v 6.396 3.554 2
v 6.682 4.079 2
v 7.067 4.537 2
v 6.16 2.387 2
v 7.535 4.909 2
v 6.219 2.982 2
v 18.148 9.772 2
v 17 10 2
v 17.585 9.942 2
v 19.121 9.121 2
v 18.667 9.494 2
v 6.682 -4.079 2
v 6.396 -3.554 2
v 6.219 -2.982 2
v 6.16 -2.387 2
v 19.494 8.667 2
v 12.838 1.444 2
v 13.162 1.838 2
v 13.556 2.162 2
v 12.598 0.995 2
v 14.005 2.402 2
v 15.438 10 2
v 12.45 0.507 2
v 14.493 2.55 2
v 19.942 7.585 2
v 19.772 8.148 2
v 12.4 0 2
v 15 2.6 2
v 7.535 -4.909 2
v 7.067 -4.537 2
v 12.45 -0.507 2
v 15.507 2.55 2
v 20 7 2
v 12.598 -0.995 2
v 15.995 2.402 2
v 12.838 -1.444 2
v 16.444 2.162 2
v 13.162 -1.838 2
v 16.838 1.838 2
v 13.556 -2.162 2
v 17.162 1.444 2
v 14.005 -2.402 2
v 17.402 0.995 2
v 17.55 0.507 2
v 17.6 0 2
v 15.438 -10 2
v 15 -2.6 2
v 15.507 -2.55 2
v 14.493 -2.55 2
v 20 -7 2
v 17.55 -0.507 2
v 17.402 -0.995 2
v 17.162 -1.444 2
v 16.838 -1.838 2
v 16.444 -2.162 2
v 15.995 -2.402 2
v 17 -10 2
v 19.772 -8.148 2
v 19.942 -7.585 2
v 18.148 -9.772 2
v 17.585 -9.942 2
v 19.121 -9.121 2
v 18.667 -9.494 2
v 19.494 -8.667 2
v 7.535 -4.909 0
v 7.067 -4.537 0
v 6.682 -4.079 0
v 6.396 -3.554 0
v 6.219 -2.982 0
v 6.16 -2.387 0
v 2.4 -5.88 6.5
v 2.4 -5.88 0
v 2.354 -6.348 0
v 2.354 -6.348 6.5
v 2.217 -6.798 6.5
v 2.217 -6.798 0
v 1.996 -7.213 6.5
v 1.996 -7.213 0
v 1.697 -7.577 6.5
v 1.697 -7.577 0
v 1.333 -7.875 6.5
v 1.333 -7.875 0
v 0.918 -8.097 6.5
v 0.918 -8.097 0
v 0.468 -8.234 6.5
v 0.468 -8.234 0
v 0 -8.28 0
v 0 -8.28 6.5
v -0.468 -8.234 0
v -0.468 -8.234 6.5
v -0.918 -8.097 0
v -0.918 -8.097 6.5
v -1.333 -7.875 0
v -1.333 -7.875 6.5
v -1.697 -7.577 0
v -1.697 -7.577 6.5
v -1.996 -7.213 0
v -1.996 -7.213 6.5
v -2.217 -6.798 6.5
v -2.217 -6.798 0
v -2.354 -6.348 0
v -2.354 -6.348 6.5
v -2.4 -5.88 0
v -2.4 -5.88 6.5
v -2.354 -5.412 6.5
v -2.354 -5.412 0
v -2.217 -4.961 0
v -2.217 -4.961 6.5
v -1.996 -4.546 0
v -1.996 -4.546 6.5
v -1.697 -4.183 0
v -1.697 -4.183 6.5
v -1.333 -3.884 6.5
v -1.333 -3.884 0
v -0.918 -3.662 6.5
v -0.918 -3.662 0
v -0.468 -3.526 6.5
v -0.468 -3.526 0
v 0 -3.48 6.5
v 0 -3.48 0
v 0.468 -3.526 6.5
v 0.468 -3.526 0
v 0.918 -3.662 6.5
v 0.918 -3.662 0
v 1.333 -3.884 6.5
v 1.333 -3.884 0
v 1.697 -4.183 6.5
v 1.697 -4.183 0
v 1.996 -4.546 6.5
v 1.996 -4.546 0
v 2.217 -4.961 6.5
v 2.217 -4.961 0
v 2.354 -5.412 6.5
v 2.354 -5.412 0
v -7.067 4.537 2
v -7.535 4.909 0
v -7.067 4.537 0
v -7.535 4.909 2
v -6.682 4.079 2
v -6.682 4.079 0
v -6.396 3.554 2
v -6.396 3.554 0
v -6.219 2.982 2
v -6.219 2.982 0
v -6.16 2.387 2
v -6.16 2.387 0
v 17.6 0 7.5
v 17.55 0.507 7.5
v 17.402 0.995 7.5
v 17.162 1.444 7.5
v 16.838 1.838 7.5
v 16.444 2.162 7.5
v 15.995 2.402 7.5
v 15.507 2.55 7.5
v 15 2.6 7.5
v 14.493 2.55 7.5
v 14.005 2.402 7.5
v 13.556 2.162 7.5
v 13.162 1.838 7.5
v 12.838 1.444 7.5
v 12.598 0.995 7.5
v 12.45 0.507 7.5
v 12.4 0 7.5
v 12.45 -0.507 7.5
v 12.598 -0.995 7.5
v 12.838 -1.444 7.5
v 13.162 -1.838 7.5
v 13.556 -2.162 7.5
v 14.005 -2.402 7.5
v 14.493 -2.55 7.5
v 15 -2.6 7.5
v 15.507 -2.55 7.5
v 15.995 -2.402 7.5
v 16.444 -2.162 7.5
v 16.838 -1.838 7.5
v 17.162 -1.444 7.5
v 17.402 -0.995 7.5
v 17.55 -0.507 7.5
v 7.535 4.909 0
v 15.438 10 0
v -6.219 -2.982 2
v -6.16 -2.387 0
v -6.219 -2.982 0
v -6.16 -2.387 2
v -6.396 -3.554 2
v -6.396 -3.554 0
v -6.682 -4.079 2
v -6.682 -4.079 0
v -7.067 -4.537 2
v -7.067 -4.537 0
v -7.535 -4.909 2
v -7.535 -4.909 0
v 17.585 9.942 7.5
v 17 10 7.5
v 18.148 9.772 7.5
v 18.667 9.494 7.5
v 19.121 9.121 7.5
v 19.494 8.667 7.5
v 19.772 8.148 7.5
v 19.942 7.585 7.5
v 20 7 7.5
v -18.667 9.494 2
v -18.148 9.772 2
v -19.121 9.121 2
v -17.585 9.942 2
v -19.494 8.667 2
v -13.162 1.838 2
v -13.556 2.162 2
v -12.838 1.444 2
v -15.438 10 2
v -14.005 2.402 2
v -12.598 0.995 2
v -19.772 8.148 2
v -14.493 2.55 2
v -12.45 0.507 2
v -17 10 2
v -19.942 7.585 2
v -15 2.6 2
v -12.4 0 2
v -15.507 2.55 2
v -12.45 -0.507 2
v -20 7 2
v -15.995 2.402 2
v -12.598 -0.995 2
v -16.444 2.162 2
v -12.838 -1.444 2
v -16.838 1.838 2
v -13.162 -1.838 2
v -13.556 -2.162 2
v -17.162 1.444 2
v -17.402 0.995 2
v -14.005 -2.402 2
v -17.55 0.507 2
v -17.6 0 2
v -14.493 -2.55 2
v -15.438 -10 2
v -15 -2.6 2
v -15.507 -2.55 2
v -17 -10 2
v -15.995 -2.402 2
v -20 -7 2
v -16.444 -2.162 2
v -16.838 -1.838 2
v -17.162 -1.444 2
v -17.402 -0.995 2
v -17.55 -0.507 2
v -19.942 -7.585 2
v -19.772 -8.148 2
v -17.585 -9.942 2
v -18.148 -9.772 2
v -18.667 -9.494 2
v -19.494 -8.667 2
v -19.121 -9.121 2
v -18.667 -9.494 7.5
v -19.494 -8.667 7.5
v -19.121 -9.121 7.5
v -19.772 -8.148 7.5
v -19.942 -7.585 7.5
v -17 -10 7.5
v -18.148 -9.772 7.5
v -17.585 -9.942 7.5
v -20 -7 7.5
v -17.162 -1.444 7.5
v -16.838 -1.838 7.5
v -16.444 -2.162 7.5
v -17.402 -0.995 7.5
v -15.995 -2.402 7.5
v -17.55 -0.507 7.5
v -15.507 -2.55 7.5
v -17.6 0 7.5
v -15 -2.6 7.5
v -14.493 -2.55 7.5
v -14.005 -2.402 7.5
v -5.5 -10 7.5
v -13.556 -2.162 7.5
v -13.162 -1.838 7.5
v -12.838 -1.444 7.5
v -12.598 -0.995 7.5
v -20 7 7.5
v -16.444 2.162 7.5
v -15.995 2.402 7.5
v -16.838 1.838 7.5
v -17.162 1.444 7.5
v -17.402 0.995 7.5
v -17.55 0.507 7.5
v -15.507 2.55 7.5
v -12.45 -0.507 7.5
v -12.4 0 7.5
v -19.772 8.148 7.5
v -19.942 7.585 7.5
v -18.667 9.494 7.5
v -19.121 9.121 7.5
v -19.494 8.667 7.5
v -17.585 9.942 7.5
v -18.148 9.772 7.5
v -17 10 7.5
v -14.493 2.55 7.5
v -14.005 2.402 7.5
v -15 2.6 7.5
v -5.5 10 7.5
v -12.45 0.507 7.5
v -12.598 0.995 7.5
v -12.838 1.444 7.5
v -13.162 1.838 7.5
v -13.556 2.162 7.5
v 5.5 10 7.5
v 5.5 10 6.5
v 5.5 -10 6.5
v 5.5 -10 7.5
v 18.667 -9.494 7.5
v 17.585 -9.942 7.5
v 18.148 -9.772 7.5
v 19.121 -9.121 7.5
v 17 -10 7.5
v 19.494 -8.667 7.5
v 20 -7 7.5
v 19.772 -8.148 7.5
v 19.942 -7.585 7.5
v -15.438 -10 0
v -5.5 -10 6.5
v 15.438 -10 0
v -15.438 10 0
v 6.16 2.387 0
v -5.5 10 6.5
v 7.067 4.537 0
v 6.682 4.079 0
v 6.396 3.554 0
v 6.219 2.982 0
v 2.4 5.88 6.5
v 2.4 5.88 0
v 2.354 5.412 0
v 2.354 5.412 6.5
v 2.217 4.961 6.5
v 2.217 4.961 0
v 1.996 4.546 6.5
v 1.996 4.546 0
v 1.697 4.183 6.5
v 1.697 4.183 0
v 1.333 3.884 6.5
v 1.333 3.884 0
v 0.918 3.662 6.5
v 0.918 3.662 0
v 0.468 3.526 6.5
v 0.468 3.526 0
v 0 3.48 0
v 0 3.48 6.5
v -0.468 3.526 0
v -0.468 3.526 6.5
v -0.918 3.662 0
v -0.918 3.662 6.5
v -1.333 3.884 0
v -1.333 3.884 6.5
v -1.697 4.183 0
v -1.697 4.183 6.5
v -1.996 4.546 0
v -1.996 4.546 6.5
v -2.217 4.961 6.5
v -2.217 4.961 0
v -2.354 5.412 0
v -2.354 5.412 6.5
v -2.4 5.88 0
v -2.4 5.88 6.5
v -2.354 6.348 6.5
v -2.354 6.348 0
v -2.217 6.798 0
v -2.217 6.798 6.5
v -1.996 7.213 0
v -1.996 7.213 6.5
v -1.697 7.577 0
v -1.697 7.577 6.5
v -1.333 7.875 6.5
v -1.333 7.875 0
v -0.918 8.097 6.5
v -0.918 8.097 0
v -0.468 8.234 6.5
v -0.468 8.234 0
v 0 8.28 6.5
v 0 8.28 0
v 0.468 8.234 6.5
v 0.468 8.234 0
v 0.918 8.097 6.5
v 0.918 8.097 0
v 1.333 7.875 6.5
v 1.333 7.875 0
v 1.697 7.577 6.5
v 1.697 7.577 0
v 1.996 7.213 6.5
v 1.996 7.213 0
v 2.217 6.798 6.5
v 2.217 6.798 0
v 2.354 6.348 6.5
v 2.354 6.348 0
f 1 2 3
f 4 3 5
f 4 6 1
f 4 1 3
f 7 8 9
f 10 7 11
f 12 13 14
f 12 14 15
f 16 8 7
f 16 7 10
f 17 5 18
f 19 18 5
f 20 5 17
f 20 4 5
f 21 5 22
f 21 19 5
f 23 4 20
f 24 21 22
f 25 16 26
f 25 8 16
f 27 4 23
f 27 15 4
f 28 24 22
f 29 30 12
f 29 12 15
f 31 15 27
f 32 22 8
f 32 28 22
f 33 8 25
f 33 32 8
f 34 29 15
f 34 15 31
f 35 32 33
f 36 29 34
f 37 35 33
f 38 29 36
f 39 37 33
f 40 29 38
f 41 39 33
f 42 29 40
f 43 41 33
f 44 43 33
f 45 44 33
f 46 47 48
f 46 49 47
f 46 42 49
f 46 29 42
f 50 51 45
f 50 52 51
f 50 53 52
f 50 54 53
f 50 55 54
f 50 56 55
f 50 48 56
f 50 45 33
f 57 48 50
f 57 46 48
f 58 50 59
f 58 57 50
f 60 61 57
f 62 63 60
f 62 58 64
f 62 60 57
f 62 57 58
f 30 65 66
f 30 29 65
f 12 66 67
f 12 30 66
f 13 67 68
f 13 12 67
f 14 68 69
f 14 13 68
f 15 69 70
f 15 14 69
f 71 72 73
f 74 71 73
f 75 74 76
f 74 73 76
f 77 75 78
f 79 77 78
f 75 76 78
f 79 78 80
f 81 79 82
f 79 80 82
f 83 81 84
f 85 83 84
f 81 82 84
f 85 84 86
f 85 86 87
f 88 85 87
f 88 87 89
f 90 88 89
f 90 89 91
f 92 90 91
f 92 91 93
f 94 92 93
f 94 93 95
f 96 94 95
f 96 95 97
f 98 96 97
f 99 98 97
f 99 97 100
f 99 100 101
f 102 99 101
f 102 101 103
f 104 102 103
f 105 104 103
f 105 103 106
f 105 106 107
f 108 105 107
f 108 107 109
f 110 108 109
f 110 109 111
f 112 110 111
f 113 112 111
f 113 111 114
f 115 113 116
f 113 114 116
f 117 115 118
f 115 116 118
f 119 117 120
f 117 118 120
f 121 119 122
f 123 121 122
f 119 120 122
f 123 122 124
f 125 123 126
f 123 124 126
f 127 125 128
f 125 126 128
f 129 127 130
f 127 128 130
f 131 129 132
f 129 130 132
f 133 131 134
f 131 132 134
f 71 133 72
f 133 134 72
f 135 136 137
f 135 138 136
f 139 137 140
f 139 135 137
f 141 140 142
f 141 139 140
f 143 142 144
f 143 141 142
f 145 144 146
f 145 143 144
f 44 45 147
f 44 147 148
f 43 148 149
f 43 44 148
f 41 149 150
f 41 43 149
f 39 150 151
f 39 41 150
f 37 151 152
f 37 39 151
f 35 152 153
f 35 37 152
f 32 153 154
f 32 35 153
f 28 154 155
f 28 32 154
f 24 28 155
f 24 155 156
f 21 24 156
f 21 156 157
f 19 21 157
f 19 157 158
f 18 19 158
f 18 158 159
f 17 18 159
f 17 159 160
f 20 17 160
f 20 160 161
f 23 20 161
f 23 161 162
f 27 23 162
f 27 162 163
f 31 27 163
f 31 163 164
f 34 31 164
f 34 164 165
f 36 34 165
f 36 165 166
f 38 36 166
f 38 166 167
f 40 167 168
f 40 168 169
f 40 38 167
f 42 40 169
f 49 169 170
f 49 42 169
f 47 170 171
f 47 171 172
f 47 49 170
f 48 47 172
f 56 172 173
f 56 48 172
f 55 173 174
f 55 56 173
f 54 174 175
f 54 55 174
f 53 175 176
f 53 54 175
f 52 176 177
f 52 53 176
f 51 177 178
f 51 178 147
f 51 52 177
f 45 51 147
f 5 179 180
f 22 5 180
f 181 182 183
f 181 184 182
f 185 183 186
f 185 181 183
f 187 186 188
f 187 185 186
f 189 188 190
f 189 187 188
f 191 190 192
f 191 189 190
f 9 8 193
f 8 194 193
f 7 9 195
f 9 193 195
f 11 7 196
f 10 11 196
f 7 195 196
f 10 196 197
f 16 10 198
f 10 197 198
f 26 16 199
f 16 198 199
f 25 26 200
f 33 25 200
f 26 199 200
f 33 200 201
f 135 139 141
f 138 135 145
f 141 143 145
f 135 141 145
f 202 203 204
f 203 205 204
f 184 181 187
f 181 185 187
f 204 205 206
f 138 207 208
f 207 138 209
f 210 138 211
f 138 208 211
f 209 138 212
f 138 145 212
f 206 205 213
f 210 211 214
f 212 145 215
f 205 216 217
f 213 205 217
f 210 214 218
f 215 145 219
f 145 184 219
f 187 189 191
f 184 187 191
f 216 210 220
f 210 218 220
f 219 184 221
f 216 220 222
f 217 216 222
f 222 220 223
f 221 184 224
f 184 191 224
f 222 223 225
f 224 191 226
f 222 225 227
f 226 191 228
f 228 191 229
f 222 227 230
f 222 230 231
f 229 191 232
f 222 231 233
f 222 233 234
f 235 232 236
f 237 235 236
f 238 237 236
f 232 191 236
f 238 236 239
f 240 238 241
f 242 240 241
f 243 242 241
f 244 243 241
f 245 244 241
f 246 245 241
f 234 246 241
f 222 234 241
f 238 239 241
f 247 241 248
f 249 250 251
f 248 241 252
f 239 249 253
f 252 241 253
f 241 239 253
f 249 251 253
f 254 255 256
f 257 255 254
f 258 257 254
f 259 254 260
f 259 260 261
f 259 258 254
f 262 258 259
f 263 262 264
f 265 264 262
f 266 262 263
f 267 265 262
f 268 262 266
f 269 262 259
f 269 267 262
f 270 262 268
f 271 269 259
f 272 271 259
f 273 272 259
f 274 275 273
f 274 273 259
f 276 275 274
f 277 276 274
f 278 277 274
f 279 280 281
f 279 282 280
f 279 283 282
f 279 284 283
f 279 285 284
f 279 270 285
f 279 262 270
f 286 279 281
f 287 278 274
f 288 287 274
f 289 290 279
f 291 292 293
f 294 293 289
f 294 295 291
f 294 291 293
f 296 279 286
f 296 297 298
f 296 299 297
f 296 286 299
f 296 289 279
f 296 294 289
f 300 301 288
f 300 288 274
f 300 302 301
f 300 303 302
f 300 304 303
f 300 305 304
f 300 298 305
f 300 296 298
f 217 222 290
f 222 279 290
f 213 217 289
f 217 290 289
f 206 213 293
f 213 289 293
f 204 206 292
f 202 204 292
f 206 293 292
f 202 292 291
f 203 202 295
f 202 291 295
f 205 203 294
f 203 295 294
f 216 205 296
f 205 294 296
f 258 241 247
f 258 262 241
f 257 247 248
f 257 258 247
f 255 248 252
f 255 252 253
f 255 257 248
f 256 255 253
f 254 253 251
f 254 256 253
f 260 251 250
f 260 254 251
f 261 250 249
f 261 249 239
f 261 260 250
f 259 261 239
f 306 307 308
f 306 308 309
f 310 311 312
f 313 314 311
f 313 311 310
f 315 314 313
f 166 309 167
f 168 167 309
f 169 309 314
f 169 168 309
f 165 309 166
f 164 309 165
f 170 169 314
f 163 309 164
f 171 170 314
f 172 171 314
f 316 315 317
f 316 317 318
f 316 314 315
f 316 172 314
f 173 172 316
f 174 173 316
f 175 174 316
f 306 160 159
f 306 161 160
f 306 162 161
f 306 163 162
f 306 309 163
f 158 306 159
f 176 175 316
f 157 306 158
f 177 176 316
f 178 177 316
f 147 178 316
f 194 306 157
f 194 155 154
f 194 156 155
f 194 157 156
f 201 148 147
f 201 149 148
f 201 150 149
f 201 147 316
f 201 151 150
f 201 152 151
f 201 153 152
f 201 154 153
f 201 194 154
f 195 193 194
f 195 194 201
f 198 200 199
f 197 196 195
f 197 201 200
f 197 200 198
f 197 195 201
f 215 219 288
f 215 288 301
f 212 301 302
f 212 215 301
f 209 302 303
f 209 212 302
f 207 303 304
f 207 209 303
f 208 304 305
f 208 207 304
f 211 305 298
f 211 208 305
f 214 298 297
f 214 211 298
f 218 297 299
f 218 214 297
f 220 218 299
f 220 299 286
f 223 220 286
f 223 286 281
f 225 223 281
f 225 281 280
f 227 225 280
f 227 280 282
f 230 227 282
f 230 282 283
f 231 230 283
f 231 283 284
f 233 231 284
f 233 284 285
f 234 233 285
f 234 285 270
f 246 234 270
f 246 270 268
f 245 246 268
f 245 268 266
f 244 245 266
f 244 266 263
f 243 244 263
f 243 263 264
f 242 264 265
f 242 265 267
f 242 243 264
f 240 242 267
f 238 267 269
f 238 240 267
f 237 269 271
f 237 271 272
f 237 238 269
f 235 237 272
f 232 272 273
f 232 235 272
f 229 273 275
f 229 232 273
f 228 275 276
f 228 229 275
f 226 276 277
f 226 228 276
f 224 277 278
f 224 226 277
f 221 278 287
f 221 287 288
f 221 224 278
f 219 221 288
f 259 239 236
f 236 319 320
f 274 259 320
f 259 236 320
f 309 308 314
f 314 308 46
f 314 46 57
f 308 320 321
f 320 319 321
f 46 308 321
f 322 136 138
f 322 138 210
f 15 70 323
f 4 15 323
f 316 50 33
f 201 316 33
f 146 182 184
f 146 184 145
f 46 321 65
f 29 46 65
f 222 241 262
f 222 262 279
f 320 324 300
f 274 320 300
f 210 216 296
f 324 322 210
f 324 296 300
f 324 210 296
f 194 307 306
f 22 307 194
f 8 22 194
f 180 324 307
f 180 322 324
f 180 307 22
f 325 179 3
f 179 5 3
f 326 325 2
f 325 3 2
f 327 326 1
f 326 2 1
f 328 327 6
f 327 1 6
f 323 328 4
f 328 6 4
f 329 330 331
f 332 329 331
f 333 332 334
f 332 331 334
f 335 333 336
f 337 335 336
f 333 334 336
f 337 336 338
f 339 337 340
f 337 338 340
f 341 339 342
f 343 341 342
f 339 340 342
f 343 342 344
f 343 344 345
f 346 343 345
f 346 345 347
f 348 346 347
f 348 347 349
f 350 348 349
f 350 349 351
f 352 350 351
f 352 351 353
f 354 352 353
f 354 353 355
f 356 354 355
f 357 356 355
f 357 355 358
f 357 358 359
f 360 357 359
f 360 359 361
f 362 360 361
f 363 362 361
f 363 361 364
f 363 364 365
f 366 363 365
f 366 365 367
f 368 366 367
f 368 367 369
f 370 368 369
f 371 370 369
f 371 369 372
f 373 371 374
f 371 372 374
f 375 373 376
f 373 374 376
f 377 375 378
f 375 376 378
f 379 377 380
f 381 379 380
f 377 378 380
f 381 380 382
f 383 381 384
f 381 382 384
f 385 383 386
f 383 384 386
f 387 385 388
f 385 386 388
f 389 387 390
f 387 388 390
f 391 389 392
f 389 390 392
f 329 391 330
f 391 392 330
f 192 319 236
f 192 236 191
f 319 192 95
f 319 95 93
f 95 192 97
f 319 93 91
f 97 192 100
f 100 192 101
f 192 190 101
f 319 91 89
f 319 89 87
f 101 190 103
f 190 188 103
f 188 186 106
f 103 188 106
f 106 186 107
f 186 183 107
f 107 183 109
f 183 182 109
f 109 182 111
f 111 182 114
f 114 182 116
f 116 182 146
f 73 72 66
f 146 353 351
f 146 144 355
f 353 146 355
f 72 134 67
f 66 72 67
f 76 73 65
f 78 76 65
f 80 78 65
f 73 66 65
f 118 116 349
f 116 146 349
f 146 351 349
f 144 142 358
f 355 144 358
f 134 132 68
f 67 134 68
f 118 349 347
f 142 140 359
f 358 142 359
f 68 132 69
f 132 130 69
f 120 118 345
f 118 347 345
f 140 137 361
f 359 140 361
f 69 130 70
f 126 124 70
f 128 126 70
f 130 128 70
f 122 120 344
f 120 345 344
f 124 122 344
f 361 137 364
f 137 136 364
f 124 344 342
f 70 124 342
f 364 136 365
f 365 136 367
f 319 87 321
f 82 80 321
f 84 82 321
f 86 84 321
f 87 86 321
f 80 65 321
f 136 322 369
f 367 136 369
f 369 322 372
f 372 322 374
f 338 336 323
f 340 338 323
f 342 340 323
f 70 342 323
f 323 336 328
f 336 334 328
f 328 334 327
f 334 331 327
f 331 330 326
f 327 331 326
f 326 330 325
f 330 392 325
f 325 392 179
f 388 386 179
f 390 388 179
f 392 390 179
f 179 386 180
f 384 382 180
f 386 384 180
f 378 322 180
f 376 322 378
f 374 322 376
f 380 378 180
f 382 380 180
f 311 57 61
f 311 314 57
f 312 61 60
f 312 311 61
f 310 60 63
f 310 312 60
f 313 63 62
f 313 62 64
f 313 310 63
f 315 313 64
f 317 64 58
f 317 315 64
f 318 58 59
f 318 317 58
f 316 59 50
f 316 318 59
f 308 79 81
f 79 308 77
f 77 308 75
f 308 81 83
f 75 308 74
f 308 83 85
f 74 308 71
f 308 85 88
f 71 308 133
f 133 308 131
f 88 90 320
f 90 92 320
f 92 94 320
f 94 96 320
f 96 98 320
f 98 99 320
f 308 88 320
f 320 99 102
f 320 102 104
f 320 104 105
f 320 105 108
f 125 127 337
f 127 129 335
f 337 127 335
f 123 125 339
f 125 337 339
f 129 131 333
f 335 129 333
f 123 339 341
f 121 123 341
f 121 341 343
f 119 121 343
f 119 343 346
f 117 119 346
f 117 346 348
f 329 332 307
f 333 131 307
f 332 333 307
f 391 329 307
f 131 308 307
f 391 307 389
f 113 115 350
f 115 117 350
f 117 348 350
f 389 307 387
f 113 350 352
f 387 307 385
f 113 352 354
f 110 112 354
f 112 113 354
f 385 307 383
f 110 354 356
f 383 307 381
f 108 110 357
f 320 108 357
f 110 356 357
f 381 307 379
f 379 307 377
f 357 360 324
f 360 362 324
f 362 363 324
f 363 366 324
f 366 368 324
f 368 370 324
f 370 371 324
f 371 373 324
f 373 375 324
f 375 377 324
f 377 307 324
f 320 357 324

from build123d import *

# Parameters (mm, degrees)
SKETCH_W        = 40
SKETCH_H        = 20
SKETCH_R        = 2.6
PAD_DEPTH       = 7.5
POCKET001_DEPTH = 2
SKETCH003_W     = 11
SKETCH003_H     = 1
POCKET_DEPTH    = 20.001
SKETCH004_R     = 2.4
POCKET002_DEPTH = 7.501
FILLET_R        = 3


with BuildPart() as part:
    # Sketch → Pad (new body)
    with BuildSketch(Plane.XY):
        Rectangle(SKETCH_W, SKETCH_H)
        with Locations((-15, 0)):
            Circle(SKETCH_R, mode=Mode.SUBTRACT)
        with Locations((15, 0)):
            Circle(SKETCH_R, mode=Mode.SUBTRACT)
    extrude(amount=PAD_DEPTH)

    # Sketch002 → Pocket001 (cut)
    with BuildSketch(Plane(origin=(0, 0, 0), x_dir=(1, 0, 0), z_dir=(0, 0, -1))):
        Polygon((20.661249, -13.364706), (20.661249, 13.364706), (6.159635, 4.022958), (6.159635, -4.022958), align=None)
    pocket001 = extrude(amount=-POCKET001_DEPTH, mode=Mode.SUBTRACT)

    # Mirrored: Pocket001 across Sketch002 V_Axis
    add(pocket001.mirror(Plane(origin=(0, 0, 0), x_dir=(0, 0, -1), z_dir=(1, 0, 0))), mode=Mode.SUBTRACT)

    # Sketch003 (on DatumPlane) → Pocket (cut, through all)
    with BuildSketch(Plane(origin=(0, 10, 0), x_dir=(-1, 0, 0), z_dir=(0, 1, 0))):
        with Locations((0, 7)):
            Rectangle(SKETCH003_W, SKETCH003_H)
    extrude(amount=-POCKET_DEPTH, mode=Mode.SUBTRACT)

    # Sketch004 (on DatumPlane) → Pocket002 (cut, through all)
    with BuildSketch(Plane(origin=(0, 0, 0), x_dir=(1, 0, 0), z_dir=(0, 0, -1))):
        with Locations((0, 5.879738)):
            Circle(SKETCH004_R)
        with Locations((0, -5.879738)):
            Circle(SKETCH004_R)
    extrude(amount=-POCKET002_DEPTH, mode=Mode.SUBTRACT)

    # Fillet
    fillet_edges = [part.edges().sort_by_distance(p)[0] for p in [
        (-6.159635, -4.022958, 1),
        (-6.159635, 4.022958, 1),
        (6.159635, -4.022958, 1),
        (6.159635, 4.022958, 1),
        (20, 10, 4.75),
        (20, -10, 4.75),
        (-20, 10, 4.75),
        (-20, -10, 4.75),
    ]]
    fillet(fillet_edges, radius=FILLET_R)


solid = part.part
